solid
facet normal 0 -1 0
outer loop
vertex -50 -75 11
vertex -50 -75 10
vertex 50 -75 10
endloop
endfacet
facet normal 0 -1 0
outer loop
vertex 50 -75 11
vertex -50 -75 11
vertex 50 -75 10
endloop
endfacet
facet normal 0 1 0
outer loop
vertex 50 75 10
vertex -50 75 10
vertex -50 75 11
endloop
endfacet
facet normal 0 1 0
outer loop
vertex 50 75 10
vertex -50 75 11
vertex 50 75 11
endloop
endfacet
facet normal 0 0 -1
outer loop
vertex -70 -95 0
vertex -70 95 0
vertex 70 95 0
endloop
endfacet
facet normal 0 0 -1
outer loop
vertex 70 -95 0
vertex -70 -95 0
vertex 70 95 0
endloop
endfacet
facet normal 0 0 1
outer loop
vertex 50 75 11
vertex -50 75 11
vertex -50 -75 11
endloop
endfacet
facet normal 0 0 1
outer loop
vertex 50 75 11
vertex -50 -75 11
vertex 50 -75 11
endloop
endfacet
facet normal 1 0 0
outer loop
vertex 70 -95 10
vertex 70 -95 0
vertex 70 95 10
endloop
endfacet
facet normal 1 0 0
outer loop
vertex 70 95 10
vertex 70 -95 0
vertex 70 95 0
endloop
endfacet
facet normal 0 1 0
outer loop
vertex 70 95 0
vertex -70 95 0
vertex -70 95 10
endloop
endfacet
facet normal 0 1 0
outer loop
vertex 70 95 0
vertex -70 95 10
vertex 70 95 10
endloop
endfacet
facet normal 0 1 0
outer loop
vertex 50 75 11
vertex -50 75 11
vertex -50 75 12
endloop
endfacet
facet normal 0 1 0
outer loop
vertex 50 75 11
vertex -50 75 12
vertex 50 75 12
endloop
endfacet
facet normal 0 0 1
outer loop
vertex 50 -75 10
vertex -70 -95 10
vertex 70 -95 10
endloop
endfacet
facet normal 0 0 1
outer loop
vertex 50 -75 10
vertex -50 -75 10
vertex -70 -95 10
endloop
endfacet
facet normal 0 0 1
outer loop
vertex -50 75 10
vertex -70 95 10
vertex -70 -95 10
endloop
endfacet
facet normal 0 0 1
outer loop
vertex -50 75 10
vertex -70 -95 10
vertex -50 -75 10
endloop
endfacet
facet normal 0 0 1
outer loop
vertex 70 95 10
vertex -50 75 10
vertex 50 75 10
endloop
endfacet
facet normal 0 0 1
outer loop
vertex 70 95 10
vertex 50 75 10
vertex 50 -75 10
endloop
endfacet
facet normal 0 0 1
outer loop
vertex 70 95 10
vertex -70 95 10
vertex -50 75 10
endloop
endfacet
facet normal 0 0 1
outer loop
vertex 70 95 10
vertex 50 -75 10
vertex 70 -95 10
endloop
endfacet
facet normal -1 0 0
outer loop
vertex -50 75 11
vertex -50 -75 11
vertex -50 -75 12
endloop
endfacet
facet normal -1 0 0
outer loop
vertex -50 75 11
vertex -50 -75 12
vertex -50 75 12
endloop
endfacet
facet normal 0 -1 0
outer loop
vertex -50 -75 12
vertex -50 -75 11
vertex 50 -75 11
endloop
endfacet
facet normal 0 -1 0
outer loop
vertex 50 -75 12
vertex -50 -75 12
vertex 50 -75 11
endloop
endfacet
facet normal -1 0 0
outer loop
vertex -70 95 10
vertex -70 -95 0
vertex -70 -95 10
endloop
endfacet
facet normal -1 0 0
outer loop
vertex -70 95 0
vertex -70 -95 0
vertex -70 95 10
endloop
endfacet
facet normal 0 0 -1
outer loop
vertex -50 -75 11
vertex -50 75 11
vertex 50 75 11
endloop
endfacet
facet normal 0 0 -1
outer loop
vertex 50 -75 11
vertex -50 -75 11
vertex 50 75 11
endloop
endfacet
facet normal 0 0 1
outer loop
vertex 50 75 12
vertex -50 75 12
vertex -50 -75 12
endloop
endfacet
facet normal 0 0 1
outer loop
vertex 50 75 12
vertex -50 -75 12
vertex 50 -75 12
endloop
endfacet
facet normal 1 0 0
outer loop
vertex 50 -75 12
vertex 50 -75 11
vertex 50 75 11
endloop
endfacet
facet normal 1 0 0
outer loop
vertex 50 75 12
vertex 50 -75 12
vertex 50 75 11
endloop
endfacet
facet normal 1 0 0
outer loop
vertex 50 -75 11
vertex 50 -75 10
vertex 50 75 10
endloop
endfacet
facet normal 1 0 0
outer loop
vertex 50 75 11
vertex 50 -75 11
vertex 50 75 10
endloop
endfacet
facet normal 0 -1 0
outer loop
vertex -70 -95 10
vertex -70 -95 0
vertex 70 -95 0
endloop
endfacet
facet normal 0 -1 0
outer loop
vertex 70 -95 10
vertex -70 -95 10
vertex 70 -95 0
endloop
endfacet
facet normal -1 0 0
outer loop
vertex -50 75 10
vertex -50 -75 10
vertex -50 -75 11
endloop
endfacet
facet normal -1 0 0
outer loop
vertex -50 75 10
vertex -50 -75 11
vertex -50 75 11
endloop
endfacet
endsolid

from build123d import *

# Parameters (mm, degrees)
F0_W      = 100
F0_H      = 150
F1_DEPTH  = 11
F0_W_2    = 140
F0_H_2    = 190
F2_DEPTH  = 10
F1_FACE_W = 100
F1_FACE_H = 150
F3_DEPTH  = 1


with BuildPart() as f1:
    # F0 (on Top) → F1 (new body)
    with BuildSketch(Plane.XY):
        Rectangle(F0_W, F0_H)
    extrude(amount=F1_DEPTH)

    # F0 (on Top) → F2 (join)
    with BuildSketch(Plane.XY):
        Rectangle(F0_W_2, F0_H_2)
        Rectangle(F0_W, F0_H, mode=Mode.SUBTRACT)
    extrude(amount=F2_DEPTH)


with BuildPart() as f3:
    # F1_face (on face) → F3 (new body)
    with BuildSketch(Plane.XY.offset(11)):
        Rectangle(F1_FACE_W, F1_FACE_H)
    extrude(amount=F3_DEPTH)


solid = Compound([f1.part, f3.part])
